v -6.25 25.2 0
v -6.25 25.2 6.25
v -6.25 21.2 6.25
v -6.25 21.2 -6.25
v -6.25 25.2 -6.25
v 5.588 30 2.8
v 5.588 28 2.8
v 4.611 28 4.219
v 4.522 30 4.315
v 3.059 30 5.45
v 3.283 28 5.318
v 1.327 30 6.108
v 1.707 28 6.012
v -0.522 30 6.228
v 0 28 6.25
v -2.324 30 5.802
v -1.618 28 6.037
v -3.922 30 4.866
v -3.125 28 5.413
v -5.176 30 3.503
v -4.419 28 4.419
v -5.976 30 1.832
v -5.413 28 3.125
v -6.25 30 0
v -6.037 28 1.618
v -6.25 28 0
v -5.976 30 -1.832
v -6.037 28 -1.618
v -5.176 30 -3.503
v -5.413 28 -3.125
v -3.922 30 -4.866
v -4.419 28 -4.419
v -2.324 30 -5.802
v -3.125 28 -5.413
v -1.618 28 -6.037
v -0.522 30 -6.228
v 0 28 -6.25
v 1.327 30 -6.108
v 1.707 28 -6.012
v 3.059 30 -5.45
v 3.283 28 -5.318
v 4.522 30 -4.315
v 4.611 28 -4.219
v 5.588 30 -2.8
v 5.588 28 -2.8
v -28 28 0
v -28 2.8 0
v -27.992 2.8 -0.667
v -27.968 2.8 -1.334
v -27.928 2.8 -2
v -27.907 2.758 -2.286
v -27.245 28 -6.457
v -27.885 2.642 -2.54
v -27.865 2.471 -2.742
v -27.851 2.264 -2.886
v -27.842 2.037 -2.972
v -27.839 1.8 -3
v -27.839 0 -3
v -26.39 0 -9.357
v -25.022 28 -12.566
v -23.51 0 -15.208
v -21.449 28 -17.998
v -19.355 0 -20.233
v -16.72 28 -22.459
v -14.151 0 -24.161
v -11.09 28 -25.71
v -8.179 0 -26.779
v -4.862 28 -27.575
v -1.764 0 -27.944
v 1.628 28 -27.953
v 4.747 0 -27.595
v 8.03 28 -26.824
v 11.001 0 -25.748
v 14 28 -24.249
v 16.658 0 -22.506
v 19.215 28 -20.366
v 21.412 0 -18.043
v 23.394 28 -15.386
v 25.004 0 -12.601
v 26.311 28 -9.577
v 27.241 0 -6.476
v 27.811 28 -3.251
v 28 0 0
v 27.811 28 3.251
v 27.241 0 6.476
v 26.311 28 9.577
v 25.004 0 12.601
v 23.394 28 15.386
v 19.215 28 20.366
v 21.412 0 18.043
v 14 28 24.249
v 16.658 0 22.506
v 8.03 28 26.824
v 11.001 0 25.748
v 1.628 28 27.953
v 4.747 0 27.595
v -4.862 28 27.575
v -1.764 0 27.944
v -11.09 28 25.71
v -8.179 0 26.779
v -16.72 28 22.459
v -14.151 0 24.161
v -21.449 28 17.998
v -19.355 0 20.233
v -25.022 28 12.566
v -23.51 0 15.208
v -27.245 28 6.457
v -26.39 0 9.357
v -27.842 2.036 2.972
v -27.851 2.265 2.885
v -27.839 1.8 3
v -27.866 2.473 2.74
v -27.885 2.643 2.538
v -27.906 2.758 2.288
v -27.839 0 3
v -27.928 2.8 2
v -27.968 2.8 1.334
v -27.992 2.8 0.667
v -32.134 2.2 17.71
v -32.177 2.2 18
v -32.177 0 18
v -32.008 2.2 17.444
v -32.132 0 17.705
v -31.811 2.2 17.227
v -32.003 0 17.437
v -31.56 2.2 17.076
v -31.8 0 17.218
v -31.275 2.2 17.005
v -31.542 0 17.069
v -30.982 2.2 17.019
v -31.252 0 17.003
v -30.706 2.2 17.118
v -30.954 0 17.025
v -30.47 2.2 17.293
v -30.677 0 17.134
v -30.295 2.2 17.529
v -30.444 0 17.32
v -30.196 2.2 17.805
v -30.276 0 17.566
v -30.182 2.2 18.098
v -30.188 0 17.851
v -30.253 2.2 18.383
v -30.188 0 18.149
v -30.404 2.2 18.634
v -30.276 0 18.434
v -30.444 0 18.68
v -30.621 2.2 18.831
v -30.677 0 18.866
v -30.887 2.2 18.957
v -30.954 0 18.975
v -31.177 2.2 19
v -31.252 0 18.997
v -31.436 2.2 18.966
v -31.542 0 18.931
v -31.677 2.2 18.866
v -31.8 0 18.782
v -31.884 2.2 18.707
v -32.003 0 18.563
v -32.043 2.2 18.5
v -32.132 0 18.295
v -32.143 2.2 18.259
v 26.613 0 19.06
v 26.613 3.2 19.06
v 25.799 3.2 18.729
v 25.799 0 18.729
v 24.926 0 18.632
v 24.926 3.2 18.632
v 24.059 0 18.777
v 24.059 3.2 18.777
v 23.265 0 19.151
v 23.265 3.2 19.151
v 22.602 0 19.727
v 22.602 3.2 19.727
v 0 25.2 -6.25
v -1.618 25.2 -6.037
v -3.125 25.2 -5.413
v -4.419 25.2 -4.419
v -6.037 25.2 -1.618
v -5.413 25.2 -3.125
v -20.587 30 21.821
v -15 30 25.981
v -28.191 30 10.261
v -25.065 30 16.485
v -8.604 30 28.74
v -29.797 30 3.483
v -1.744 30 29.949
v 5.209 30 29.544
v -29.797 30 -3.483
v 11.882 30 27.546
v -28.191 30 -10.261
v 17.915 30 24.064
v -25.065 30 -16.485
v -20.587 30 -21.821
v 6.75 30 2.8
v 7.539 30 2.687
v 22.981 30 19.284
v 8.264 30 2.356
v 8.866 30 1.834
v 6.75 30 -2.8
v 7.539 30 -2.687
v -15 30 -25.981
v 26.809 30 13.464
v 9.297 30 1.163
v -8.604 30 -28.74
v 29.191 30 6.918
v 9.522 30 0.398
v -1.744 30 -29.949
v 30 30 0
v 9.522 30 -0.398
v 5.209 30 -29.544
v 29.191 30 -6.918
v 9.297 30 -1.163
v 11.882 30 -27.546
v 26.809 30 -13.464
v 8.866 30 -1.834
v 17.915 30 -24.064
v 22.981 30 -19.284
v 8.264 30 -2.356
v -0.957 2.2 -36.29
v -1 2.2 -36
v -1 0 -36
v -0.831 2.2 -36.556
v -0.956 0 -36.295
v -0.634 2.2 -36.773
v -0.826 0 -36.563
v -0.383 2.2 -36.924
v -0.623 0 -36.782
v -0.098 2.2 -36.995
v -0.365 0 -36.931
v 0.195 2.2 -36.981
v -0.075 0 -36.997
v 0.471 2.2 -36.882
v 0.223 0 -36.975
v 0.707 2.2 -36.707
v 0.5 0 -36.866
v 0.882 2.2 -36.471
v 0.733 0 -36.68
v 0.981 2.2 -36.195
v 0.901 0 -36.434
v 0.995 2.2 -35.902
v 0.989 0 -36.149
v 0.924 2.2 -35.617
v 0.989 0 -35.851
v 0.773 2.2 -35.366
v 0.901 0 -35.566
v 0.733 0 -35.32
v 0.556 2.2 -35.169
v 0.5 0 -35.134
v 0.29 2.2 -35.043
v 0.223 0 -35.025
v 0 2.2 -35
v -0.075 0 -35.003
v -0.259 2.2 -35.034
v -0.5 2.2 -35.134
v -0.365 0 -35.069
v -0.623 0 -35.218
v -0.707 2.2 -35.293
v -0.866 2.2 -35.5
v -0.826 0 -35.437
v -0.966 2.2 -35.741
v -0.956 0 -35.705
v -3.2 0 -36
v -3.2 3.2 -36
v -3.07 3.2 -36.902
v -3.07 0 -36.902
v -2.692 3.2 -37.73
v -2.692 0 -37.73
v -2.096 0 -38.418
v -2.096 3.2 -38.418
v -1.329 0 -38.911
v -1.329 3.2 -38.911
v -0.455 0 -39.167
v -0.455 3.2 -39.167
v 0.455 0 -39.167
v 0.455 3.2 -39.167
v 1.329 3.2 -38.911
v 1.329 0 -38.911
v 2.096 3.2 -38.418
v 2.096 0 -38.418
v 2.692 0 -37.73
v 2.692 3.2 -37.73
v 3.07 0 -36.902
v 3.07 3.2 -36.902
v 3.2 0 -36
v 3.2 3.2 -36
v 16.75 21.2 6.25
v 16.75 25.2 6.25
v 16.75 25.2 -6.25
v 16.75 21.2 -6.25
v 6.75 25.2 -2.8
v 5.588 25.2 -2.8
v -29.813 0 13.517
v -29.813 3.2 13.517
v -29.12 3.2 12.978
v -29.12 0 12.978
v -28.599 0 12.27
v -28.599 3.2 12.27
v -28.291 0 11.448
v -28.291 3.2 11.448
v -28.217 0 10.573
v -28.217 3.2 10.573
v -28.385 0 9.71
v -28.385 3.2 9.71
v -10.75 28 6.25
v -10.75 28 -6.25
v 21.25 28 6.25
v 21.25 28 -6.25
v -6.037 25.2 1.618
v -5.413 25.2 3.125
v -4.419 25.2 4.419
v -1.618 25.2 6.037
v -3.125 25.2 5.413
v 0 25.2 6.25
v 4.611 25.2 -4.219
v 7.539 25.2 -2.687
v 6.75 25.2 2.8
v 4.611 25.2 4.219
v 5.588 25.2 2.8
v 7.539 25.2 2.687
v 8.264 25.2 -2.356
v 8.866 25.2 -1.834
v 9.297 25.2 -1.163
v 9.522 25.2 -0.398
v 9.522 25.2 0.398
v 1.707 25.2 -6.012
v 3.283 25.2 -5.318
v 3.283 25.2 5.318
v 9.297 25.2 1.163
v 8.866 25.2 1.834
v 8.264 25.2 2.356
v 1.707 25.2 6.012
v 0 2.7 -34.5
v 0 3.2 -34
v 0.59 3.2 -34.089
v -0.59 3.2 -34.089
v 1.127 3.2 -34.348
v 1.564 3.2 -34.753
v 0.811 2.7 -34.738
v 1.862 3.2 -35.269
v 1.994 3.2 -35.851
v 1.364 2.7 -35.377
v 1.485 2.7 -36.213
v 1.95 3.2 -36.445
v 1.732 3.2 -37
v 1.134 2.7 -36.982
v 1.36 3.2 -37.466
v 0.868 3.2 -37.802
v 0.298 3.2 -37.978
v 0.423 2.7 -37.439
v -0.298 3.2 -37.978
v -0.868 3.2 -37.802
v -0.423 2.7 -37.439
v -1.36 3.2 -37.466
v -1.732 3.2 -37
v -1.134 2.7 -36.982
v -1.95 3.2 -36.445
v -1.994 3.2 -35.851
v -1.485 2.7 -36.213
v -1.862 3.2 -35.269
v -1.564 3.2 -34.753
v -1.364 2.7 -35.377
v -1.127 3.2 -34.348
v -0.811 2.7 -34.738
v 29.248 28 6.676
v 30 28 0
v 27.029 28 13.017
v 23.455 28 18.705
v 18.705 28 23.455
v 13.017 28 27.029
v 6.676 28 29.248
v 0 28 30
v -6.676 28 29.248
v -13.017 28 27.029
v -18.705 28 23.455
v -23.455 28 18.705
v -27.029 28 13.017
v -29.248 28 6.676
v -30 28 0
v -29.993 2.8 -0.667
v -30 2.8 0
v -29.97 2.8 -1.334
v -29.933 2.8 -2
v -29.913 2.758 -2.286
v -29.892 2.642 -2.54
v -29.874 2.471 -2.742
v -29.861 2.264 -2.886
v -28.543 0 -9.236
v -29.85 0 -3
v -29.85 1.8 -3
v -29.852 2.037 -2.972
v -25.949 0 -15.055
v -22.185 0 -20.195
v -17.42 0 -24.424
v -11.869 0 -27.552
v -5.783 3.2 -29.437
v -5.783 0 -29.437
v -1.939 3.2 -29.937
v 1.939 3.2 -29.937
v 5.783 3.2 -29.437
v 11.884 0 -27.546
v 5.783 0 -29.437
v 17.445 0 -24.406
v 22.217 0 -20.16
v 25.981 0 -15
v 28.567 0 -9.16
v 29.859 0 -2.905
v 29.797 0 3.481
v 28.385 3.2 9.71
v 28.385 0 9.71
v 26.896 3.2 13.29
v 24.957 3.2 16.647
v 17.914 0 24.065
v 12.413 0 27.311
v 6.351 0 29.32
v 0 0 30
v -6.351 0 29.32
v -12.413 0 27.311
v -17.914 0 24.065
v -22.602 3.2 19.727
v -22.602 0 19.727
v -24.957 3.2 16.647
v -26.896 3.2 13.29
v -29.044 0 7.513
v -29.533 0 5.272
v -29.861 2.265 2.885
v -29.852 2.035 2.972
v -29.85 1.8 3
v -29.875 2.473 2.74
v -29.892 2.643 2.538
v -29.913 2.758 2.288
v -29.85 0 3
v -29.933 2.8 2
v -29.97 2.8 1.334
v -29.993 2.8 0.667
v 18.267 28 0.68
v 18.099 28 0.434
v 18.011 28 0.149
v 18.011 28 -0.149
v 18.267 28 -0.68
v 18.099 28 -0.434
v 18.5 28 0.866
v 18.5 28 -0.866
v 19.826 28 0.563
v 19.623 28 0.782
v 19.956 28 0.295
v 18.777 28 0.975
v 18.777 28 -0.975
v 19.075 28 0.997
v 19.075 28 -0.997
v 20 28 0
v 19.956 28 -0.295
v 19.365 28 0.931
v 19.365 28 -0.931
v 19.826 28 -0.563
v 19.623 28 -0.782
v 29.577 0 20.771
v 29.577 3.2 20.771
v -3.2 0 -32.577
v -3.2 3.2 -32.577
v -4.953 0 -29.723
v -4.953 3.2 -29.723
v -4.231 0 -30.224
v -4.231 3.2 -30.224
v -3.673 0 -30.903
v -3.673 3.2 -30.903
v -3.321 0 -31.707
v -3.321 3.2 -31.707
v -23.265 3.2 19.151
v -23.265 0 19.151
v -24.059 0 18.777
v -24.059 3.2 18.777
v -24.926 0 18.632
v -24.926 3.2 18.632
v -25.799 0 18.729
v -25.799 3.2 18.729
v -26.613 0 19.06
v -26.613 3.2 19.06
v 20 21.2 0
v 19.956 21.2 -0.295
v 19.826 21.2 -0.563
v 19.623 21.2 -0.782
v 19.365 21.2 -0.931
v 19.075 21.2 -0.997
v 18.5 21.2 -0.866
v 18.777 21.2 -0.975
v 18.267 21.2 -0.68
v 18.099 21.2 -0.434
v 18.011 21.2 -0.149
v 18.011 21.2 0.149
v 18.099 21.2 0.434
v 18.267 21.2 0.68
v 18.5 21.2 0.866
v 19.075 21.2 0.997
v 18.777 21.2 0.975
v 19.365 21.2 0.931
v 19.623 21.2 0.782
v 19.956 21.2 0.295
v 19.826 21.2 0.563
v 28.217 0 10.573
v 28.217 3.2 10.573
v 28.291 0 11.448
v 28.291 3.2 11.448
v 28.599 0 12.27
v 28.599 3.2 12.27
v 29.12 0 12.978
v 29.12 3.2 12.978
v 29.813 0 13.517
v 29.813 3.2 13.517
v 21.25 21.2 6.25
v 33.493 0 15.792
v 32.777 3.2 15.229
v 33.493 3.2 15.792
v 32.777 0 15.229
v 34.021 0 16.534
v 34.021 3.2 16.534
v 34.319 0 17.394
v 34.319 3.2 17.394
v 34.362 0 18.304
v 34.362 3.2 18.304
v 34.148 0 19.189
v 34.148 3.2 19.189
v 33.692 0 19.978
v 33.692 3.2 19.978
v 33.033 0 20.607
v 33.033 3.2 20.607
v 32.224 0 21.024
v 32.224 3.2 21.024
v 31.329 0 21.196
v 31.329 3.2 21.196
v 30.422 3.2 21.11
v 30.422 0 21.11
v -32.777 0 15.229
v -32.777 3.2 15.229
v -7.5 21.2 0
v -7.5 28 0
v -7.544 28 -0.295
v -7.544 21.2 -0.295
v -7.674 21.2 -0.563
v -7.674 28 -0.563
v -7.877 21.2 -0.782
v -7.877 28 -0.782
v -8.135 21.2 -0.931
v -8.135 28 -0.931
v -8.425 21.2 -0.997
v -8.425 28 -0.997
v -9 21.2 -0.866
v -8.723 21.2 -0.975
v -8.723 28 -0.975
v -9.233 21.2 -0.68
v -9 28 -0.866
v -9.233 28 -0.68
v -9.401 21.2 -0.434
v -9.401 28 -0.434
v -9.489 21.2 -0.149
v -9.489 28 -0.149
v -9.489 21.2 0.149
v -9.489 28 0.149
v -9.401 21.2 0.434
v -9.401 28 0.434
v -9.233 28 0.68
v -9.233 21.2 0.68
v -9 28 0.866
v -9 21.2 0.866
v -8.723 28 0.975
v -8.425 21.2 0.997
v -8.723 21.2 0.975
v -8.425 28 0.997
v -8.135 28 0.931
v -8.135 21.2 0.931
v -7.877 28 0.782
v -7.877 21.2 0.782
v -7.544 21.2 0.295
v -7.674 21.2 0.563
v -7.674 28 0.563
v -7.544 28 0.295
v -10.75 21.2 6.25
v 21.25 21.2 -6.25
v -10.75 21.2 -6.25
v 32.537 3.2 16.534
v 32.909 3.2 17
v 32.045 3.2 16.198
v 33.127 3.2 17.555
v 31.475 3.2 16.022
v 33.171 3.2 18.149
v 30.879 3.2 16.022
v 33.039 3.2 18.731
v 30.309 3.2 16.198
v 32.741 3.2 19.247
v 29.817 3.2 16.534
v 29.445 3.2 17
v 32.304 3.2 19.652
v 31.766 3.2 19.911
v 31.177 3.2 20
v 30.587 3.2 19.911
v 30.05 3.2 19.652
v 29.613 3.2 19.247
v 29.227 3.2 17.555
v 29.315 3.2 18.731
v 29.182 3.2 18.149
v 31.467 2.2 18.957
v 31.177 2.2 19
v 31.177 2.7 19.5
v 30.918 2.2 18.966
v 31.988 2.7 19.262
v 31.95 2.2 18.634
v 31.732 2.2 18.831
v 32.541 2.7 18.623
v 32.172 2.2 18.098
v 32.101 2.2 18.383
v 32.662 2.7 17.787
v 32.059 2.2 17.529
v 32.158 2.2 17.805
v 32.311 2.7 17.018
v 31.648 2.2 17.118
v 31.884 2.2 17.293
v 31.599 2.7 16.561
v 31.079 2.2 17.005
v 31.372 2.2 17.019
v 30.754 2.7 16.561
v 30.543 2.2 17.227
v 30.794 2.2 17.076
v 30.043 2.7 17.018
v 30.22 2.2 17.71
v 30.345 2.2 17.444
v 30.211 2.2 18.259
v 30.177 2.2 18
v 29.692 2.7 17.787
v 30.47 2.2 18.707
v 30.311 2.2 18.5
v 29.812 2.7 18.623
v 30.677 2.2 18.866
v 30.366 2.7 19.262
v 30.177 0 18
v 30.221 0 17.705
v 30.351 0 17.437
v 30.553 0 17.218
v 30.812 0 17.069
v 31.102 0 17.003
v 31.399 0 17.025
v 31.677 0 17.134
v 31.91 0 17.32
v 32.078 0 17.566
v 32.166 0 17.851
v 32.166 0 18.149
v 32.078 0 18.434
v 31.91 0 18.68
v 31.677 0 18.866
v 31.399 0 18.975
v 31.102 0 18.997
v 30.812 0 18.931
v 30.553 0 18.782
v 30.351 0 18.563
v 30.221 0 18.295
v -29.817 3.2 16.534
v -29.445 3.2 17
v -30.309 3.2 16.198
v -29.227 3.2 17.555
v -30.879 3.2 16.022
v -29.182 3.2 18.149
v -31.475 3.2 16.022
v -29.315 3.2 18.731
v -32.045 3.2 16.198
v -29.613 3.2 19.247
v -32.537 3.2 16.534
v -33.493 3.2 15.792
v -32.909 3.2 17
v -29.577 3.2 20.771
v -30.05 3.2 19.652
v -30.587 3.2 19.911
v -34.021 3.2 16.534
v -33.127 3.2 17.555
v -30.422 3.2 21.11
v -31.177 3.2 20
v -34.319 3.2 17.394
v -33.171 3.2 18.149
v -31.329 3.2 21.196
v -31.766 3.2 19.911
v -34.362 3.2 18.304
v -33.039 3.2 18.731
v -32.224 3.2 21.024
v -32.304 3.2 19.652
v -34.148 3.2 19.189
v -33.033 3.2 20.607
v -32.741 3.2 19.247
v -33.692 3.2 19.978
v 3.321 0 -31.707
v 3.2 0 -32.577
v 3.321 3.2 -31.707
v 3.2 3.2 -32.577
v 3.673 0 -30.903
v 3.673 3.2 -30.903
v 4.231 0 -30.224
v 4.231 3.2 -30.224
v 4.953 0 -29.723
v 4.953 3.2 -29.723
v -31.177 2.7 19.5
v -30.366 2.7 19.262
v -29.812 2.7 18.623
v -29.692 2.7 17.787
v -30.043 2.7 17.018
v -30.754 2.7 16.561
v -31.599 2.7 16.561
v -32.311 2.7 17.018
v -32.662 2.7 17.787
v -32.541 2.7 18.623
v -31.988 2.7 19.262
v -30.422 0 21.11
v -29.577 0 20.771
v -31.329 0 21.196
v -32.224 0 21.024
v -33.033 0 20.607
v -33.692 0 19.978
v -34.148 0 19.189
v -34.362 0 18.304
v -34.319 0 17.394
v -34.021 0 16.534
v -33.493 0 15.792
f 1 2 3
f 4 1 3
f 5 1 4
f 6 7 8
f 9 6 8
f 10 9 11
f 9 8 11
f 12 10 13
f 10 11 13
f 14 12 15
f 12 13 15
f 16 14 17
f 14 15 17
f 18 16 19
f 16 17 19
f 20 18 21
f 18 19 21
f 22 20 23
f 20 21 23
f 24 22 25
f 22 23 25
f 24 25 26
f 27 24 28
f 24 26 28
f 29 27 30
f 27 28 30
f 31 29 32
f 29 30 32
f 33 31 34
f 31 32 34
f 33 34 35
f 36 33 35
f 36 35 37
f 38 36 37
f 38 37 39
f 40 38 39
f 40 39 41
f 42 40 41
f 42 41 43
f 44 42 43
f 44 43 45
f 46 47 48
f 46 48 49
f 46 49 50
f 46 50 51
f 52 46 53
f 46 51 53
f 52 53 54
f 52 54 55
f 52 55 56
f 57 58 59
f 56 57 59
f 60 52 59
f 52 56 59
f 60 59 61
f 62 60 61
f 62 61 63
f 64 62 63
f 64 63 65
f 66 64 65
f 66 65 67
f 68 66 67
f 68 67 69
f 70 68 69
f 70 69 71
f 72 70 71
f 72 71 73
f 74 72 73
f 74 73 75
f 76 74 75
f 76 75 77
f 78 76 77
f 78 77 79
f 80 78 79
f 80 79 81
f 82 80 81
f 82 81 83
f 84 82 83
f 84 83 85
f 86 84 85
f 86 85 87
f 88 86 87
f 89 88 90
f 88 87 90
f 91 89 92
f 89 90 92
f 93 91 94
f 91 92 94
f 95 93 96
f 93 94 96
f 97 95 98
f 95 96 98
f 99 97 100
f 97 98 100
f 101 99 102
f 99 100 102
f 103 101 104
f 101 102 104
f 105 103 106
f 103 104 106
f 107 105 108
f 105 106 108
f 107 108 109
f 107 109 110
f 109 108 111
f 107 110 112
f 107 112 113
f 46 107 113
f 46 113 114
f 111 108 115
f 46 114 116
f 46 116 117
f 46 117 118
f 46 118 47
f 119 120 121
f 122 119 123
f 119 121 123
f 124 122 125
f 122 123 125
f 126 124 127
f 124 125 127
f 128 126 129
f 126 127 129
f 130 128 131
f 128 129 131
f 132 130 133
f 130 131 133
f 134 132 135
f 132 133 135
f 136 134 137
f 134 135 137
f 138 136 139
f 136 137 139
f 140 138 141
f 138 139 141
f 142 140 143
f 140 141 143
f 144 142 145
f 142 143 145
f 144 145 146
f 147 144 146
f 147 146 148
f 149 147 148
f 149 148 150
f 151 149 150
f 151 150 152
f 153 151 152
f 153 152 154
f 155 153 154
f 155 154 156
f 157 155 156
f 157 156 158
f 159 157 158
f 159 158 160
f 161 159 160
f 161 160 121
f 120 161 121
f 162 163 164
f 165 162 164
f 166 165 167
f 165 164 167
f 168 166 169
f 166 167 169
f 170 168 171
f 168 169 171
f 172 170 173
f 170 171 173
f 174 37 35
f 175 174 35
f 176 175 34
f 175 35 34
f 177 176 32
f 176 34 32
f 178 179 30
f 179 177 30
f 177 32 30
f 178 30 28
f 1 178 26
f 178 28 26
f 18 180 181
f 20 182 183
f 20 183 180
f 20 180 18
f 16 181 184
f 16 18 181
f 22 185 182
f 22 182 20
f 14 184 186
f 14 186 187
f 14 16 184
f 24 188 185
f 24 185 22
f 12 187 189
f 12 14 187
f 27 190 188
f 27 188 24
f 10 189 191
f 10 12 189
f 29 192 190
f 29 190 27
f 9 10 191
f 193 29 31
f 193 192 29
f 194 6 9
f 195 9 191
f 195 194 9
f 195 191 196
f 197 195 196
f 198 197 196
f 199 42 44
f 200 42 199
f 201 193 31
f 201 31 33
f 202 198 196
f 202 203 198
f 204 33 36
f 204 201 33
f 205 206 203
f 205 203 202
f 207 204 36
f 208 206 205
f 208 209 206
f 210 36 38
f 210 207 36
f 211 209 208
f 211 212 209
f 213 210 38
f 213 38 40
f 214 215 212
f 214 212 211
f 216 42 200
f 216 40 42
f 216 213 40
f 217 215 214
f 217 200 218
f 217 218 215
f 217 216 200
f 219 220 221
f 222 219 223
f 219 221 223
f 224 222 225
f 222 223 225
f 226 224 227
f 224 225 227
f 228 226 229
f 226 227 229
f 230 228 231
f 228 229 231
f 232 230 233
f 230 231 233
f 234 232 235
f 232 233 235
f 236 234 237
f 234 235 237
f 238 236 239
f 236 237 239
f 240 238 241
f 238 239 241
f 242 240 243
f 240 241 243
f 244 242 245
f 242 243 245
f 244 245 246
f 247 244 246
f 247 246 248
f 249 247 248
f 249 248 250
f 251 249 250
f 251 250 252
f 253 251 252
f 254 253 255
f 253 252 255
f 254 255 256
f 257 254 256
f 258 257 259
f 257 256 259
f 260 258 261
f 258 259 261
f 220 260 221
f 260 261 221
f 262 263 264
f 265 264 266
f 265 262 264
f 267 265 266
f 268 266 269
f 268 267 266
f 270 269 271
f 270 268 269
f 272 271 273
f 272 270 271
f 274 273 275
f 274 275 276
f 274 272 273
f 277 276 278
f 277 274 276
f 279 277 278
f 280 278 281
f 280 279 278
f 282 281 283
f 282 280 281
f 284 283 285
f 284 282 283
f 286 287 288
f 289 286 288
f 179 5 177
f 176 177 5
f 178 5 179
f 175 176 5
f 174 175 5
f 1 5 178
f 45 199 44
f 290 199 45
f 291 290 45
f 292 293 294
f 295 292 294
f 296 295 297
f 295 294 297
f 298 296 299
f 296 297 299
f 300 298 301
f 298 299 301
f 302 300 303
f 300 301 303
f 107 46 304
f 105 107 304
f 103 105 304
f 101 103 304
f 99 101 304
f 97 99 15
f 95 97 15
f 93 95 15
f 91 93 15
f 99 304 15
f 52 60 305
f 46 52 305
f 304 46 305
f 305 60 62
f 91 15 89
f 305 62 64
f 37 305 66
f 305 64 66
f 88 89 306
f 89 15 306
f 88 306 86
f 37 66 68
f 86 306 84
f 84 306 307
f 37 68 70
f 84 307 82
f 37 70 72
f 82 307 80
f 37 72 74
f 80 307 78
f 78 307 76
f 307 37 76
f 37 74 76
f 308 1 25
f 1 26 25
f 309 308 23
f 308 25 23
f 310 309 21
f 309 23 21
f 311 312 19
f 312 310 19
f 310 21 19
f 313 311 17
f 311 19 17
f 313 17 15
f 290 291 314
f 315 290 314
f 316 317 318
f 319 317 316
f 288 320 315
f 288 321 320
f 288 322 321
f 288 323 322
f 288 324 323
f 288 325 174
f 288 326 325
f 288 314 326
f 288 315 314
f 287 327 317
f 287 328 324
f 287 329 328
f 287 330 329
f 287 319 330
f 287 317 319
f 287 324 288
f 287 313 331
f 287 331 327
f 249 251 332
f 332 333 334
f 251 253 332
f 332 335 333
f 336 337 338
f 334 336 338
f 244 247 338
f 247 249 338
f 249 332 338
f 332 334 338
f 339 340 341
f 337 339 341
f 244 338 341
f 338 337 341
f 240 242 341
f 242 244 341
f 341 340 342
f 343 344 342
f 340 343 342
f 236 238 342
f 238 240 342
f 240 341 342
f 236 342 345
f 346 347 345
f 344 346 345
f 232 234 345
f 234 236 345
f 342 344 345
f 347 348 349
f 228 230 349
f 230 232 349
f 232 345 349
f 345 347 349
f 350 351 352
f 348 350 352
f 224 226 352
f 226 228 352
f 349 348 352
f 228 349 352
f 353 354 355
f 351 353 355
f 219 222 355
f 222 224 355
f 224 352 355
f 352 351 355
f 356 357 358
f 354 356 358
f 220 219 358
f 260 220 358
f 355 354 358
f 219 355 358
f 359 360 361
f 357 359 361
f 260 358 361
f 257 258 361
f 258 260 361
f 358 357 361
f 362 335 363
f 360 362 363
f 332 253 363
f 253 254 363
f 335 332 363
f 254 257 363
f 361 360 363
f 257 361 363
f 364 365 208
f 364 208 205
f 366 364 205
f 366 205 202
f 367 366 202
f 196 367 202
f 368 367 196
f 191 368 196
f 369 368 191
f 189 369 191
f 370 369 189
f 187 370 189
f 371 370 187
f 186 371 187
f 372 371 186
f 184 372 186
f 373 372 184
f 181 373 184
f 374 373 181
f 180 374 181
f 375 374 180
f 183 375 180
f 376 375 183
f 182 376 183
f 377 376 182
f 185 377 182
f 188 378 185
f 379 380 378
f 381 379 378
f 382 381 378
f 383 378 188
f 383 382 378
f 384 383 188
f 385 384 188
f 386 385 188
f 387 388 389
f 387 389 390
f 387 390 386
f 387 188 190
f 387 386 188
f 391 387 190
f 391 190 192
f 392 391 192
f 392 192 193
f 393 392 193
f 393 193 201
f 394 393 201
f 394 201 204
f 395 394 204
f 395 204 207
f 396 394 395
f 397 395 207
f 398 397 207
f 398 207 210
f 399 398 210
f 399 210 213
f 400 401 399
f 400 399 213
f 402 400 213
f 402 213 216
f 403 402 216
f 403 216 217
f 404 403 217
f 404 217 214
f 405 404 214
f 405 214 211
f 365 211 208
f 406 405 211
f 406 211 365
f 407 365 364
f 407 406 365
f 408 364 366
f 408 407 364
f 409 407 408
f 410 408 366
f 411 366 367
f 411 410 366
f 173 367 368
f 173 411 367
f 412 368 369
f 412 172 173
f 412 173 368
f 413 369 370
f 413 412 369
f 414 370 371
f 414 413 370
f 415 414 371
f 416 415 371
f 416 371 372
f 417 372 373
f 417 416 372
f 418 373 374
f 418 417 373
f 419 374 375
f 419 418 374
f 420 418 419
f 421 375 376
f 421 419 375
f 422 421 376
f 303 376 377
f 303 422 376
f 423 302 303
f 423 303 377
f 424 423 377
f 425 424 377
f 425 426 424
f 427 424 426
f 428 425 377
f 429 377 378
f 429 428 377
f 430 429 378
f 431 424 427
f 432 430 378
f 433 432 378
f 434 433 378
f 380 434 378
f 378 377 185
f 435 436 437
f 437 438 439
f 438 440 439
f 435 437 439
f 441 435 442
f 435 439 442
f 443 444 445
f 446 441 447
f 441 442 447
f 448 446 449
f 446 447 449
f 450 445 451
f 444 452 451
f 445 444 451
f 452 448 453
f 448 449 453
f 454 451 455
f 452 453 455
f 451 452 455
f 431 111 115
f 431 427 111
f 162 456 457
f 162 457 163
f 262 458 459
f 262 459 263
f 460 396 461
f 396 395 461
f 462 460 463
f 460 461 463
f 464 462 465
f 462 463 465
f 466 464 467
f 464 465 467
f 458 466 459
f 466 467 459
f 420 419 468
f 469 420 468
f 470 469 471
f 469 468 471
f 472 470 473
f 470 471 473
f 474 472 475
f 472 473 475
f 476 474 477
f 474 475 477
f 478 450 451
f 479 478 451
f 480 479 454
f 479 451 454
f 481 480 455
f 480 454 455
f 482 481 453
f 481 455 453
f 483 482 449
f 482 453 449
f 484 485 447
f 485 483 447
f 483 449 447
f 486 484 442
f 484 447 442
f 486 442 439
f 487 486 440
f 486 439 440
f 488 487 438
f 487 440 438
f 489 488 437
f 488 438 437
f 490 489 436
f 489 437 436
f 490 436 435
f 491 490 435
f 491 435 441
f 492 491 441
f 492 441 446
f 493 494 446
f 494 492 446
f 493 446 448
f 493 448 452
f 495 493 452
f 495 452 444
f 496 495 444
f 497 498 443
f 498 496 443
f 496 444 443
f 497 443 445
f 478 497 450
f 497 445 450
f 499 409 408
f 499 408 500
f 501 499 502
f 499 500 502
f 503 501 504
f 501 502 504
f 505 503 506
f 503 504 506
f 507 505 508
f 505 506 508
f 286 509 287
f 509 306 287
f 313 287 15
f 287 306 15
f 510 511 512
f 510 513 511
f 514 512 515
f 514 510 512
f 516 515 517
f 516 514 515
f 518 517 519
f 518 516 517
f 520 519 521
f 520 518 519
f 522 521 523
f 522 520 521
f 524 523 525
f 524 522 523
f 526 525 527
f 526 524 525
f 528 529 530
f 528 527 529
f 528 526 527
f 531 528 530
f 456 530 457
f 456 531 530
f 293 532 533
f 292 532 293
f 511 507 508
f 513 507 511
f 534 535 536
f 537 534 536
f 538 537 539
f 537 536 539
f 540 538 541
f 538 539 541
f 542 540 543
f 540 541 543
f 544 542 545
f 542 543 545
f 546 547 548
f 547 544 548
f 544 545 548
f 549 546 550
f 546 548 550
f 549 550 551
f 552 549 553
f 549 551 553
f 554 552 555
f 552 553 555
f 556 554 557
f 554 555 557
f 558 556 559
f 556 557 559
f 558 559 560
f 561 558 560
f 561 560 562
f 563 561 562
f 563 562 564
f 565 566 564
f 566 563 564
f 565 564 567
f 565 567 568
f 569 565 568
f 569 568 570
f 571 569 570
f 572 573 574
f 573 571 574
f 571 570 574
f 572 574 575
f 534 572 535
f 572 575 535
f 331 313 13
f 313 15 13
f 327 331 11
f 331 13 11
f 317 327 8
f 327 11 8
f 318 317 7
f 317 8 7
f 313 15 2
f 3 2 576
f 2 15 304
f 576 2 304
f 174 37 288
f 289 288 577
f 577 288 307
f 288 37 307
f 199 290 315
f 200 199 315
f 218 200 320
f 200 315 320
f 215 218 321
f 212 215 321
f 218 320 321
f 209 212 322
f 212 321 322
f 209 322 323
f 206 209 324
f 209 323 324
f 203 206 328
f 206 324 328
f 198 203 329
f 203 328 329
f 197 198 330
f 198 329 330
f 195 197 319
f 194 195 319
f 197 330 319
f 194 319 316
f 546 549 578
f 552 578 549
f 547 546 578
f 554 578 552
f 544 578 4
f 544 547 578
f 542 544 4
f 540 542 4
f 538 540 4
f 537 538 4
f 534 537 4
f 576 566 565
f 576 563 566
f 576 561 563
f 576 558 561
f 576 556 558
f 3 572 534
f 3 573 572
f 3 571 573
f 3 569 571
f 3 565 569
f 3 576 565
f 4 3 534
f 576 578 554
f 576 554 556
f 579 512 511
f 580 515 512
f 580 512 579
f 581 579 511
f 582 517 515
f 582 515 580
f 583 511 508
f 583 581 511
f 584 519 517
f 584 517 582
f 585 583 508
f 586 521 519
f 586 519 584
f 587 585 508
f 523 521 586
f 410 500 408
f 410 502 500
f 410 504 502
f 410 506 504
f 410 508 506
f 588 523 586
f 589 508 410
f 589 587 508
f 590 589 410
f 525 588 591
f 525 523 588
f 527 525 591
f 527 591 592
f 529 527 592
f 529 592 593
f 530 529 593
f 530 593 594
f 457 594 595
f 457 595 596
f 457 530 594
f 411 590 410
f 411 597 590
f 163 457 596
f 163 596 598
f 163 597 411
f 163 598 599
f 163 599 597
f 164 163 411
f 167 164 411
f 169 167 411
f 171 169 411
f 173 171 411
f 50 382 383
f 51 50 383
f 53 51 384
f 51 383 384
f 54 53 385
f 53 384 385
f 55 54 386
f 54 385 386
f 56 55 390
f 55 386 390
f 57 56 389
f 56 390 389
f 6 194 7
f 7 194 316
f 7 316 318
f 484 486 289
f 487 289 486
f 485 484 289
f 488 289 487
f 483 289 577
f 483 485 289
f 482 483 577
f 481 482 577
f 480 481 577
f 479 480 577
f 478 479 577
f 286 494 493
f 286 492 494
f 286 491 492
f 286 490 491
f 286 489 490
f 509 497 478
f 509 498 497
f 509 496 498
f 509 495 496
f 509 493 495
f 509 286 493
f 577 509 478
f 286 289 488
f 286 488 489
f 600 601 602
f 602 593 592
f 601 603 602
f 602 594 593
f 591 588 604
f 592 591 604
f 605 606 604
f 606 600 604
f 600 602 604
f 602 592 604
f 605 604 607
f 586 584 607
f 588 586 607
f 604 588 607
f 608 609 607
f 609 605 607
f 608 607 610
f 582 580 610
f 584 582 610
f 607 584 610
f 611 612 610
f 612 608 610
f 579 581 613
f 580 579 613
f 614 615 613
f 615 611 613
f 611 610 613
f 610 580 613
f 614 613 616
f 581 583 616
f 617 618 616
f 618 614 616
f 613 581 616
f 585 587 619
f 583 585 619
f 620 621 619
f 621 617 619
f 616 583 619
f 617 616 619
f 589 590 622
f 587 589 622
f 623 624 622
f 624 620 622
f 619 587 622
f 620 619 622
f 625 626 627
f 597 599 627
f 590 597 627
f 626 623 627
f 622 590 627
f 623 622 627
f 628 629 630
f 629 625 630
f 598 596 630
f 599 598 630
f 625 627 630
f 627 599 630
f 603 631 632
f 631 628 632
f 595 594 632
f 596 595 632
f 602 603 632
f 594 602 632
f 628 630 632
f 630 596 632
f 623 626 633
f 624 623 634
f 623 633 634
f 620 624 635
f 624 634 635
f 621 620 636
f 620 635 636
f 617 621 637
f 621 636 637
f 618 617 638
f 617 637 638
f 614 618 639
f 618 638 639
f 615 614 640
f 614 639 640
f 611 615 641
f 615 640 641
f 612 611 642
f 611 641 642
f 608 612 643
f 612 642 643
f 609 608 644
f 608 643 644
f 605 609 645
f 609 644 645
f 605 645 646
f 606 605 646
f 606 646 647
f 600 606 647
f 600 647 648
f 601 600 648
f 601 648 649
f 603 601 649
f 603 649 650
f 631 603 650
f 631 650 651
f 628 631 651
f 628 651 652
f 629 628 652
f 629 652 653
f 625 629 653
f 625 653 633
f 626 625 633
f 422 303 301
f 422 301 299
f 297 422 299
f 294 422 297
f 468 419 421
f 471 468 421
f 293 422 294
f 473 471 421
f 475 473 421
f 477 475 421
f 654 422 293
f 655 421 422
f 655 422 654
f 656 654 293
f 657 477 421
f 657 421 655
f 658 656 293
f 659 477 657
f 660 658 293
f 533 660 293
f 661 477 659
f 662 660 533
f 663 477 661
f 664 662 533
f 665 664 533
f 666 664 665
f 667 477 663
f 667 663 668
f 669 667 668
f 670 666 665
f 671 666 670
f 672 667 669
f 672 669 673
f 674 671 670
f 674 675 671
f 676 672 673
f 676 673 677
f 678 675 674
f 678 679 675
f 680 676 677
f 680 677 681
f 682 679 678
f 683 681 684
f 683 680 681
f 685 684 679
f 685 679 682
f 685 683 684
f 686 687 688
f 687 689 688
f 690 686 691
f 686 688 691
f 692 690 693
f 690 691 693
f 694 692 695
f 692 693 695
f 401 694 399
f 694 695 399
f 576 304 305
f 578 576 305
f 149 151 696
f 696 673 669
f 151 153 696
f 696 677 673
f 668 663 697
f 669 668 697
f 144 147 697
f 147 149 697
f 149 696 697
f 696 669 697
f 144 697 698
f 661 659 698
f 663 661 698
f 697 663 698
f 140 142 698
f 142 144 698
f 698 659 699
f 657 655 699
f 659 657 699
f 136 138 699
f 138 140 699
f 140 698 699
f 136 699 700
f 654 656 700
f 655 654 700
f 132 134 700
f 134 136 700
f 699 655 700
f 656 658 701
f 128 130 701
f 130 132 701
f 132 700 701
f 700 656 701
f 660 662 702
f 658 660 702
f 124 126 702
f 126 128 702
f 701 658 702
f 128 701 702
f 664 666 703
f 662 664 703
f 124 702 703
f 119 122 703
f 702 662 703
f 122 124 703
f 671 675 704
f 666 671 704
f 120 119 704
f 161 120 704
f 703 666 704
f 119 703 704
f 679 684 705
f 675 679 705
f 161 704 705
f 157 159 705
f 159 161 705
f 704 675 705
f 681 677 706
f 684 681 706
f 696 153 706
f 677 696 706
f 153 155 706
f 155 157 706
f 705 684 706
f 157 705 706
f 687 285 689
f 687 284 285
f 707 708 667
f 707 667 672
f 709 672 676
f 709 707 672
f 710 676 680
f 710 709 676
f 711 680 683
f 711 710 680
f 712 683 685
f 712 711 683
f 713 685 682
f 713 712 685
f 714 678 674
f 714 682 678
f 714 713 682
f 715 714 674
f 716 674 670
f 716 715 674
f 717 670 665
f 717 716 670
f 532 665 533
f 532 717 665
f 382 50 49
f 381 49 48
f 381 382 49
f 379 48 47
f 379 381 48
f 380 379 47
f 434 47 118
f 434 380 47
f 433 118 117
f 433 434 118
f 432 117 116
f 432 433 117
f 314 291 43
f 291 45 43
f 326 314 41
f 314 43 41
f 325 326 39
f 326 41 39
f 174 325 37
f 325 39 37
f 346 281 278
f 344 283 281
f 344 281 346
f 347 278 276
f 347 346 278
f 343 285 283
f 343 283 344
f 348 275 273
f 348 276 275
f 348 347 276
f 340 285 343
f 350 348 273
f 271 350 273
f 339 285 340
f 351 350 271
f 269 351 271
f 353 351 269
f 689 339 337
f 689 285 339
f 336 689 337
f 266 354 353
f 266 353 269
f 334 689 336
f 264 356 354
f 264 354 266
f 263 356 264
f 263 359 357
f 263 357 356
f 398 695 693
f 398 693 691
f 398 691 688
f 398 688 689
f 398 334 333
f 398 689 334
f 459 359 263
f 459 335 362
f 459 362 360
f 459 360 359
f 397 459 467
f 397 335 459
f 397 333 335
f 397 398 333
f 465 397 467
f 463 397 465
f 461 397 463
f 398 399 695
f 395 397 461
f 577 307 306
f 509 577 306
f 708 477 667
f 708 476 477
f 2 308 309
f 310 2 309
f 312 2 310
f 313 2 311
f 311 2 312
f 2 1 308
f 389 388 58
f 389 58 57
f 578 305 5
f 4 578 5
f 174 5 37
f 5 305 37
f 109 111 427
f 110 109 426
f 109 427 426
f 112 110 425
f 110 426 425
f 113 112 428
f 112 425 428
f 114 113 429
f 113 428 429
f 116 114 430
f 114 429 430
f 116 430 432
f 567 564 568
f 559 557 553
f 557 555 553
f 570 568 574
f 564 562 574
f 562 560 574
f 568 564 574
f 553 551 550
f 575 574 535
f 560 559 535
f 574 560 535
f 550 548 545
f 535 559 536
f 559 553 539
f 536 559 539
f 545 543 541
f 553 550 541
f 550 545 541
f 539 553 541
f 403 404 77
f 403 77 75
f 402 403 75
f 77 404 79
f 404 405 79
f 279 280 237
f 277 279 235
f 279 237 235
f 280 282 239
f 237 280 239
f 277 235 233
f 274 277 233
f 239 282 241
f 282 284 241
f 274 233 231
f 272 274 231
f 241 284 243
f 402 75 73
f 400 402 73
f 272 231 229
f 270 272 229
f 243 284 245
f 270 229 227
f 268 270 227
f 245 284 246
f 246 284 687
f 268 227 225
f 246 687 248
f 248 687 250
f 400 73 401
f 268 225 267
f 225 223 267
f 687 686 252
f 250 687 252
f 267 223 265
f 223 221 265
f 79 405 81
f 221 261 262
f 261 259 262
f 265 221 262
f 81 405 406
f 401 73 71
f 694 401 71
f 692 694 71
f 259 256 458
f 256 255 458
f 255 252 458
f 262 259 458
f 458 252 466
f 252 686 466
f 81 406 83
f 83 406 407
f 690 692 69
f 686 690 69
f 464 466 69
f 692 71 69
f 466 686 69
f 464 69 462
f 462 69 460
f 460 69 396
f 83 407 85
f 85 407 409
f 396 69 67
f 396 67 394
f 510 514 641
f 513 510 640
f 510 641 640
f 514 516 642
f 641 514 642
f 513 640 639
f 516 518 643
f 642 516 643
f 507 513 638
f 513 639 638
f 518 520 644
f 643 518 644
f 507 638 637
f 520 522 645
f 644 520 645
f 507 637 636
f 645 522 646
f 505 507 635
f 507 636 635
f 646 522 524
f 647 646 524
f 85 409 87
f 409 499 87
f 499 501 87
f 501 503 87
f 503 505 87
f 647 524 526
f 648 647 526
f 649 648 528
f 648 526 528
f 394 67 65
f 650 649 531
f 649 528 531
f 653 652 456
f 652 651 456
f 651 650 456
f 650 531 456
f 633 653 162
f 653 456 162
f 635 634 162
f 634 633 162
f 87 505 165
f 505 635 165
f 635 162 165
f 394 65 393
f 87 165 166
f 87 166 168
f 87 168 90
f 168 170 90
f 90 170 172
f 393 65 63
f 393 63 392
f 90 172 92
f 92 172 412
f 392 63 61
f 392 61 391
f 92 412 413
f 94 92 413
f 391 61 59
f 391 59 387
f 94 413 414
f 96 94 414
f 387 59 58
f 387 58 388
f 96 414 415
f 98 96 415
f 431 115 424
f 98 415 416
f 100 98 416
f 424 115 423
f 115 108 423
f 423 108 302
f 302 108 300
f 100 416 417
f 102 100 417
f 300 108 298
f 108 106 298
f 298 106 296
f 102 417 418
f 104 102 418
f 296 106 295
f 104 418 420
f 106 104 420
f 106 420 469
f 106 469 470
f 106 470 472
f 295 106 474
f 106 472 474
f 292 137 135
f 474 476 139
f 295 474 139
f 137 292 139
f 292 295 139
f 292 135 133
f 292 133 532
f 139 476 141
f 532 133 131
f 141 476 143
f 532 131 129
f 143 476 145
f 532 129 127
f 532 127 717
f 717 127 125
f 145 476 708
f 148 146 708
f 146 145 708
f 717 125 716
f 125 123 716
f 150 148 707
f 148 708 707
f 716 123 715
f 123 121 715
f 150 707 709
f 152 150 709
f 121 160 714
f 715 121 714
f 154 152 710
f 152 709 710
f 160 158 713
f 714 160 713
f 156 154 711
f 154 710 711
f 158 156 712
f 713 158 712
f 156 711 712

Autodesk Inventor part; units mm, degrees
ref_plane "XZ Plane" through (0, 0, 0) normal (0, 1, 0) x (-1, 0, 0)
ref_plane "XY Plane" through (0, 0, 0) normal (0, 0, 1) x (1, 0, 0)
sketch "スケッチ1" plane through (0, 0, 0) normal (0, 1, 0) x (-1, 0, 0)
  circle A0 centre (0, 0) radius 30
  circle A1 centre (0, 0) radius 28
  line L0 (-17.5, -7.5) -> (17.5, -7.5)
  line L1 (17.5, -7.5) -> (17.5, 7.5)
  line L2 (17.5, 7.5) -> (-17.5, 7.5)
  line L3 (-17.5, 7.5) -> (-17.5, -7.5)
  line L4 (97.1207, 0) -> (-153.0696, 0)
  line L5 (0, -103.0521) -> (0, 127.3799)
  line L6 (3.2, -29.8288) -> (3.2, -36)
  arc A2 (-3.2, -36) -> (3.2, -36) centre (0, -36) ccw
  line L7 (-3.2, -36) -> (-3.2, -29.8288)
  circle A3 centre (0, -36) radius 1
  arc A4 (32.7769, 15.2287) -> (29.5769, 20.7713) centre (31.1769, 18) ccw
  circle A5 centre (31.1769, 18) radius 1
  line L8 (32.7769, 15.2287) -> (27.4325, 12.1431)
  line L9 (24.2325, 17.6857) -> (29.5769, 20.7713)
  arc A6 (-29.5769, 20.7713) -> (-32.7769, 15.2287) centre (-31.1769, 18) ccw
  circle A7 centre (-31.1769, 18) radius 1
  line L10 (-29.5769, 20.7713) -> (-24.2325, 17.6857)
  line L11 (-27.4325, 12.1431) -> (-32.7769, 15.2287)
  dimension "d0" = 35
  dimension "d1" = 15
  dimension "d2" = 56
  dimension "d3" = 2
  dimension "d4" = 3.2
  dimension "d5" = 36
  dimension "d6" = 2
  dimension "d9" = 360
extrude "押し出し1" add sketch "スケッチ1" along normal blind 28 contours L4 A1 L5 A0 | A0 L5 A1 L4 | A0 L4 A1 L5 | A1 L4 A0 L5
extrude "押し出し2" add sketch "スケッチ1" along normal blind 3.2 contours A0 L9 A4 L8 | L6 A2 L5 A3 A0 | L5 A3 A2 L7 A0 | A0 L11 A6 L10
sketch "スケッチ2" plane through (0, 28, 0) normal (0, 1, 0) x (1, 0, 0)
  circle A0 centre (0, 0) radius 30
  circle A1 centre (0, 0) radius 30 projected
extrude "押し出し3" add sketch "スケッチ2" along normal blind 2
sketch "スケッチ3" plane through (0, 28, 0) normal (0, -1, 0) x (1, 0, 0)
  line L0 (-10.75, -6.25) -> (21.25, -6.25)
  line L1 (21.25, -6.25) -> (21.25, 6.25)
  line L2 (21.25, 6.25) -> (-10.75, 6.25)
  line L3 (-10.75, 6.25) -> (-10.75, -6.25)
  line L4 (-52.7206, 0) -> (77.3772, 0) construction
  line L5 (0, 47.1232) -> (0, -27.9509)
  line L6 (-6.25, 6.25) -> (-6.25, -6.25)
  line L7 (16.75, 6.25) -> (16.75, -6.25)
  arc A0 (5.5877, 2.8) -> (5.5877, -2.8) centre (0, 0) ccw
  line L8 (6.75, 2.8) -> (5.5877, 2.8)
  line L9 (6.75, -2.8) -> (5.5877, -2.8)
  circle A1 centre (-8.5, 0) radius 1
  circle A2 centre (19, 0) radius 1
  arc A3 (6.75, -2.8) -> (6.75, 2.8) centre (6.75, 0) ccw
  point P0 (0, -6.25)
  point P1 (0, 6.25)
  point P2 (-6.25, 0)
  dimension "d17" = 4.5
  dimension "d18" = 4.5
  dimension "d19" = 2
  dimension "d20" = 2.25
  dimension "d21" = 2.25
  dimension "d22" = 13
  dimension "d23" = 12.5
  dimension "d24" = 23
  dimension "d26" = 2.8
extrude "押し出し4" cut sketch "スケッチ3" against normal through all contours A0 L5 | L5 A0 L8 A3 L9
extrude "押し出し5" add sketch "スケッチ3" along normal blind 2.8 contours L6 A0 L0 | A0 L9 A3 L8 L2 L7 L0 | L6 L2 A0
extrude "押し出し6" add sketch "スケッチ3" along normal blind 6.8 contours L3 L2 L6 L0 | L7 L2 L1 L0
ref_plane "作業平面1" through (-30, 0, 0) normal (1, 0, 0) x (0, 1, 0)
sketch "スケッチ4" plane through (-30, 0, 0) normal (1, 0, 0) x (0, 1, 0)
  line L0 (-6.8871, 0) -> (24.1455, 0)
  line L1 (0, -3) -> (1.8, -3)
  line L2 (2.8, -2) -> (2.8, 2)
  line L3 (1.8, 3) -> (0, 3)
  line L4 (0, 3) -> (0, -3)
  arc A0 (1.8, -3) -> (2.8, -2) centre (1.8, -2) ccw
  arc A1 (2.8, 2) -> (1.8, 3) centre (1.8, 2) ccw
  point P0 (0, 0)
  point P1 (2.8, 3)
  point P2 (2.8, -3)
  dimension "d34" = 6
  dimension "d35" = 2.8
  dimension "d36" = 1
  dimension "d37" = 1
extrude "押し出し7" cut sketch "スケッチ4" along normal up to surface
fillet "フィレット1" radius 3.2 6 edges at (24.2325, 1.6, 17.6857) (27.4325, 1.6, 12.1431) (3.2, 1.6, -29.8288) (-3.2, 1.6, -29.8288) (-27.4325, 1.6, 12.1431) (-24.2325, 1.6, 17.6857)
sketch "スケッチ5" plane through (0, 3.2, 0) normal (0, 1, 0) x (1, 0, 0)
  circle A0 centre (31.1769, -18) radius 1 projected
  circle A1 centre (-31.1769, -18) radius 1 projected
  circle A2 centre (0, 36) radius 1 projected
  point P0 (0, 0)
hole "穴1" at (31.1769, 3.2, 18) at (-31.1769, 3.2, 18) at (0, 3.2, -36) direction (0, -1, 0) diameter 2 end through all countersink diameter 4 countersink angle 90
properties part number "base"
